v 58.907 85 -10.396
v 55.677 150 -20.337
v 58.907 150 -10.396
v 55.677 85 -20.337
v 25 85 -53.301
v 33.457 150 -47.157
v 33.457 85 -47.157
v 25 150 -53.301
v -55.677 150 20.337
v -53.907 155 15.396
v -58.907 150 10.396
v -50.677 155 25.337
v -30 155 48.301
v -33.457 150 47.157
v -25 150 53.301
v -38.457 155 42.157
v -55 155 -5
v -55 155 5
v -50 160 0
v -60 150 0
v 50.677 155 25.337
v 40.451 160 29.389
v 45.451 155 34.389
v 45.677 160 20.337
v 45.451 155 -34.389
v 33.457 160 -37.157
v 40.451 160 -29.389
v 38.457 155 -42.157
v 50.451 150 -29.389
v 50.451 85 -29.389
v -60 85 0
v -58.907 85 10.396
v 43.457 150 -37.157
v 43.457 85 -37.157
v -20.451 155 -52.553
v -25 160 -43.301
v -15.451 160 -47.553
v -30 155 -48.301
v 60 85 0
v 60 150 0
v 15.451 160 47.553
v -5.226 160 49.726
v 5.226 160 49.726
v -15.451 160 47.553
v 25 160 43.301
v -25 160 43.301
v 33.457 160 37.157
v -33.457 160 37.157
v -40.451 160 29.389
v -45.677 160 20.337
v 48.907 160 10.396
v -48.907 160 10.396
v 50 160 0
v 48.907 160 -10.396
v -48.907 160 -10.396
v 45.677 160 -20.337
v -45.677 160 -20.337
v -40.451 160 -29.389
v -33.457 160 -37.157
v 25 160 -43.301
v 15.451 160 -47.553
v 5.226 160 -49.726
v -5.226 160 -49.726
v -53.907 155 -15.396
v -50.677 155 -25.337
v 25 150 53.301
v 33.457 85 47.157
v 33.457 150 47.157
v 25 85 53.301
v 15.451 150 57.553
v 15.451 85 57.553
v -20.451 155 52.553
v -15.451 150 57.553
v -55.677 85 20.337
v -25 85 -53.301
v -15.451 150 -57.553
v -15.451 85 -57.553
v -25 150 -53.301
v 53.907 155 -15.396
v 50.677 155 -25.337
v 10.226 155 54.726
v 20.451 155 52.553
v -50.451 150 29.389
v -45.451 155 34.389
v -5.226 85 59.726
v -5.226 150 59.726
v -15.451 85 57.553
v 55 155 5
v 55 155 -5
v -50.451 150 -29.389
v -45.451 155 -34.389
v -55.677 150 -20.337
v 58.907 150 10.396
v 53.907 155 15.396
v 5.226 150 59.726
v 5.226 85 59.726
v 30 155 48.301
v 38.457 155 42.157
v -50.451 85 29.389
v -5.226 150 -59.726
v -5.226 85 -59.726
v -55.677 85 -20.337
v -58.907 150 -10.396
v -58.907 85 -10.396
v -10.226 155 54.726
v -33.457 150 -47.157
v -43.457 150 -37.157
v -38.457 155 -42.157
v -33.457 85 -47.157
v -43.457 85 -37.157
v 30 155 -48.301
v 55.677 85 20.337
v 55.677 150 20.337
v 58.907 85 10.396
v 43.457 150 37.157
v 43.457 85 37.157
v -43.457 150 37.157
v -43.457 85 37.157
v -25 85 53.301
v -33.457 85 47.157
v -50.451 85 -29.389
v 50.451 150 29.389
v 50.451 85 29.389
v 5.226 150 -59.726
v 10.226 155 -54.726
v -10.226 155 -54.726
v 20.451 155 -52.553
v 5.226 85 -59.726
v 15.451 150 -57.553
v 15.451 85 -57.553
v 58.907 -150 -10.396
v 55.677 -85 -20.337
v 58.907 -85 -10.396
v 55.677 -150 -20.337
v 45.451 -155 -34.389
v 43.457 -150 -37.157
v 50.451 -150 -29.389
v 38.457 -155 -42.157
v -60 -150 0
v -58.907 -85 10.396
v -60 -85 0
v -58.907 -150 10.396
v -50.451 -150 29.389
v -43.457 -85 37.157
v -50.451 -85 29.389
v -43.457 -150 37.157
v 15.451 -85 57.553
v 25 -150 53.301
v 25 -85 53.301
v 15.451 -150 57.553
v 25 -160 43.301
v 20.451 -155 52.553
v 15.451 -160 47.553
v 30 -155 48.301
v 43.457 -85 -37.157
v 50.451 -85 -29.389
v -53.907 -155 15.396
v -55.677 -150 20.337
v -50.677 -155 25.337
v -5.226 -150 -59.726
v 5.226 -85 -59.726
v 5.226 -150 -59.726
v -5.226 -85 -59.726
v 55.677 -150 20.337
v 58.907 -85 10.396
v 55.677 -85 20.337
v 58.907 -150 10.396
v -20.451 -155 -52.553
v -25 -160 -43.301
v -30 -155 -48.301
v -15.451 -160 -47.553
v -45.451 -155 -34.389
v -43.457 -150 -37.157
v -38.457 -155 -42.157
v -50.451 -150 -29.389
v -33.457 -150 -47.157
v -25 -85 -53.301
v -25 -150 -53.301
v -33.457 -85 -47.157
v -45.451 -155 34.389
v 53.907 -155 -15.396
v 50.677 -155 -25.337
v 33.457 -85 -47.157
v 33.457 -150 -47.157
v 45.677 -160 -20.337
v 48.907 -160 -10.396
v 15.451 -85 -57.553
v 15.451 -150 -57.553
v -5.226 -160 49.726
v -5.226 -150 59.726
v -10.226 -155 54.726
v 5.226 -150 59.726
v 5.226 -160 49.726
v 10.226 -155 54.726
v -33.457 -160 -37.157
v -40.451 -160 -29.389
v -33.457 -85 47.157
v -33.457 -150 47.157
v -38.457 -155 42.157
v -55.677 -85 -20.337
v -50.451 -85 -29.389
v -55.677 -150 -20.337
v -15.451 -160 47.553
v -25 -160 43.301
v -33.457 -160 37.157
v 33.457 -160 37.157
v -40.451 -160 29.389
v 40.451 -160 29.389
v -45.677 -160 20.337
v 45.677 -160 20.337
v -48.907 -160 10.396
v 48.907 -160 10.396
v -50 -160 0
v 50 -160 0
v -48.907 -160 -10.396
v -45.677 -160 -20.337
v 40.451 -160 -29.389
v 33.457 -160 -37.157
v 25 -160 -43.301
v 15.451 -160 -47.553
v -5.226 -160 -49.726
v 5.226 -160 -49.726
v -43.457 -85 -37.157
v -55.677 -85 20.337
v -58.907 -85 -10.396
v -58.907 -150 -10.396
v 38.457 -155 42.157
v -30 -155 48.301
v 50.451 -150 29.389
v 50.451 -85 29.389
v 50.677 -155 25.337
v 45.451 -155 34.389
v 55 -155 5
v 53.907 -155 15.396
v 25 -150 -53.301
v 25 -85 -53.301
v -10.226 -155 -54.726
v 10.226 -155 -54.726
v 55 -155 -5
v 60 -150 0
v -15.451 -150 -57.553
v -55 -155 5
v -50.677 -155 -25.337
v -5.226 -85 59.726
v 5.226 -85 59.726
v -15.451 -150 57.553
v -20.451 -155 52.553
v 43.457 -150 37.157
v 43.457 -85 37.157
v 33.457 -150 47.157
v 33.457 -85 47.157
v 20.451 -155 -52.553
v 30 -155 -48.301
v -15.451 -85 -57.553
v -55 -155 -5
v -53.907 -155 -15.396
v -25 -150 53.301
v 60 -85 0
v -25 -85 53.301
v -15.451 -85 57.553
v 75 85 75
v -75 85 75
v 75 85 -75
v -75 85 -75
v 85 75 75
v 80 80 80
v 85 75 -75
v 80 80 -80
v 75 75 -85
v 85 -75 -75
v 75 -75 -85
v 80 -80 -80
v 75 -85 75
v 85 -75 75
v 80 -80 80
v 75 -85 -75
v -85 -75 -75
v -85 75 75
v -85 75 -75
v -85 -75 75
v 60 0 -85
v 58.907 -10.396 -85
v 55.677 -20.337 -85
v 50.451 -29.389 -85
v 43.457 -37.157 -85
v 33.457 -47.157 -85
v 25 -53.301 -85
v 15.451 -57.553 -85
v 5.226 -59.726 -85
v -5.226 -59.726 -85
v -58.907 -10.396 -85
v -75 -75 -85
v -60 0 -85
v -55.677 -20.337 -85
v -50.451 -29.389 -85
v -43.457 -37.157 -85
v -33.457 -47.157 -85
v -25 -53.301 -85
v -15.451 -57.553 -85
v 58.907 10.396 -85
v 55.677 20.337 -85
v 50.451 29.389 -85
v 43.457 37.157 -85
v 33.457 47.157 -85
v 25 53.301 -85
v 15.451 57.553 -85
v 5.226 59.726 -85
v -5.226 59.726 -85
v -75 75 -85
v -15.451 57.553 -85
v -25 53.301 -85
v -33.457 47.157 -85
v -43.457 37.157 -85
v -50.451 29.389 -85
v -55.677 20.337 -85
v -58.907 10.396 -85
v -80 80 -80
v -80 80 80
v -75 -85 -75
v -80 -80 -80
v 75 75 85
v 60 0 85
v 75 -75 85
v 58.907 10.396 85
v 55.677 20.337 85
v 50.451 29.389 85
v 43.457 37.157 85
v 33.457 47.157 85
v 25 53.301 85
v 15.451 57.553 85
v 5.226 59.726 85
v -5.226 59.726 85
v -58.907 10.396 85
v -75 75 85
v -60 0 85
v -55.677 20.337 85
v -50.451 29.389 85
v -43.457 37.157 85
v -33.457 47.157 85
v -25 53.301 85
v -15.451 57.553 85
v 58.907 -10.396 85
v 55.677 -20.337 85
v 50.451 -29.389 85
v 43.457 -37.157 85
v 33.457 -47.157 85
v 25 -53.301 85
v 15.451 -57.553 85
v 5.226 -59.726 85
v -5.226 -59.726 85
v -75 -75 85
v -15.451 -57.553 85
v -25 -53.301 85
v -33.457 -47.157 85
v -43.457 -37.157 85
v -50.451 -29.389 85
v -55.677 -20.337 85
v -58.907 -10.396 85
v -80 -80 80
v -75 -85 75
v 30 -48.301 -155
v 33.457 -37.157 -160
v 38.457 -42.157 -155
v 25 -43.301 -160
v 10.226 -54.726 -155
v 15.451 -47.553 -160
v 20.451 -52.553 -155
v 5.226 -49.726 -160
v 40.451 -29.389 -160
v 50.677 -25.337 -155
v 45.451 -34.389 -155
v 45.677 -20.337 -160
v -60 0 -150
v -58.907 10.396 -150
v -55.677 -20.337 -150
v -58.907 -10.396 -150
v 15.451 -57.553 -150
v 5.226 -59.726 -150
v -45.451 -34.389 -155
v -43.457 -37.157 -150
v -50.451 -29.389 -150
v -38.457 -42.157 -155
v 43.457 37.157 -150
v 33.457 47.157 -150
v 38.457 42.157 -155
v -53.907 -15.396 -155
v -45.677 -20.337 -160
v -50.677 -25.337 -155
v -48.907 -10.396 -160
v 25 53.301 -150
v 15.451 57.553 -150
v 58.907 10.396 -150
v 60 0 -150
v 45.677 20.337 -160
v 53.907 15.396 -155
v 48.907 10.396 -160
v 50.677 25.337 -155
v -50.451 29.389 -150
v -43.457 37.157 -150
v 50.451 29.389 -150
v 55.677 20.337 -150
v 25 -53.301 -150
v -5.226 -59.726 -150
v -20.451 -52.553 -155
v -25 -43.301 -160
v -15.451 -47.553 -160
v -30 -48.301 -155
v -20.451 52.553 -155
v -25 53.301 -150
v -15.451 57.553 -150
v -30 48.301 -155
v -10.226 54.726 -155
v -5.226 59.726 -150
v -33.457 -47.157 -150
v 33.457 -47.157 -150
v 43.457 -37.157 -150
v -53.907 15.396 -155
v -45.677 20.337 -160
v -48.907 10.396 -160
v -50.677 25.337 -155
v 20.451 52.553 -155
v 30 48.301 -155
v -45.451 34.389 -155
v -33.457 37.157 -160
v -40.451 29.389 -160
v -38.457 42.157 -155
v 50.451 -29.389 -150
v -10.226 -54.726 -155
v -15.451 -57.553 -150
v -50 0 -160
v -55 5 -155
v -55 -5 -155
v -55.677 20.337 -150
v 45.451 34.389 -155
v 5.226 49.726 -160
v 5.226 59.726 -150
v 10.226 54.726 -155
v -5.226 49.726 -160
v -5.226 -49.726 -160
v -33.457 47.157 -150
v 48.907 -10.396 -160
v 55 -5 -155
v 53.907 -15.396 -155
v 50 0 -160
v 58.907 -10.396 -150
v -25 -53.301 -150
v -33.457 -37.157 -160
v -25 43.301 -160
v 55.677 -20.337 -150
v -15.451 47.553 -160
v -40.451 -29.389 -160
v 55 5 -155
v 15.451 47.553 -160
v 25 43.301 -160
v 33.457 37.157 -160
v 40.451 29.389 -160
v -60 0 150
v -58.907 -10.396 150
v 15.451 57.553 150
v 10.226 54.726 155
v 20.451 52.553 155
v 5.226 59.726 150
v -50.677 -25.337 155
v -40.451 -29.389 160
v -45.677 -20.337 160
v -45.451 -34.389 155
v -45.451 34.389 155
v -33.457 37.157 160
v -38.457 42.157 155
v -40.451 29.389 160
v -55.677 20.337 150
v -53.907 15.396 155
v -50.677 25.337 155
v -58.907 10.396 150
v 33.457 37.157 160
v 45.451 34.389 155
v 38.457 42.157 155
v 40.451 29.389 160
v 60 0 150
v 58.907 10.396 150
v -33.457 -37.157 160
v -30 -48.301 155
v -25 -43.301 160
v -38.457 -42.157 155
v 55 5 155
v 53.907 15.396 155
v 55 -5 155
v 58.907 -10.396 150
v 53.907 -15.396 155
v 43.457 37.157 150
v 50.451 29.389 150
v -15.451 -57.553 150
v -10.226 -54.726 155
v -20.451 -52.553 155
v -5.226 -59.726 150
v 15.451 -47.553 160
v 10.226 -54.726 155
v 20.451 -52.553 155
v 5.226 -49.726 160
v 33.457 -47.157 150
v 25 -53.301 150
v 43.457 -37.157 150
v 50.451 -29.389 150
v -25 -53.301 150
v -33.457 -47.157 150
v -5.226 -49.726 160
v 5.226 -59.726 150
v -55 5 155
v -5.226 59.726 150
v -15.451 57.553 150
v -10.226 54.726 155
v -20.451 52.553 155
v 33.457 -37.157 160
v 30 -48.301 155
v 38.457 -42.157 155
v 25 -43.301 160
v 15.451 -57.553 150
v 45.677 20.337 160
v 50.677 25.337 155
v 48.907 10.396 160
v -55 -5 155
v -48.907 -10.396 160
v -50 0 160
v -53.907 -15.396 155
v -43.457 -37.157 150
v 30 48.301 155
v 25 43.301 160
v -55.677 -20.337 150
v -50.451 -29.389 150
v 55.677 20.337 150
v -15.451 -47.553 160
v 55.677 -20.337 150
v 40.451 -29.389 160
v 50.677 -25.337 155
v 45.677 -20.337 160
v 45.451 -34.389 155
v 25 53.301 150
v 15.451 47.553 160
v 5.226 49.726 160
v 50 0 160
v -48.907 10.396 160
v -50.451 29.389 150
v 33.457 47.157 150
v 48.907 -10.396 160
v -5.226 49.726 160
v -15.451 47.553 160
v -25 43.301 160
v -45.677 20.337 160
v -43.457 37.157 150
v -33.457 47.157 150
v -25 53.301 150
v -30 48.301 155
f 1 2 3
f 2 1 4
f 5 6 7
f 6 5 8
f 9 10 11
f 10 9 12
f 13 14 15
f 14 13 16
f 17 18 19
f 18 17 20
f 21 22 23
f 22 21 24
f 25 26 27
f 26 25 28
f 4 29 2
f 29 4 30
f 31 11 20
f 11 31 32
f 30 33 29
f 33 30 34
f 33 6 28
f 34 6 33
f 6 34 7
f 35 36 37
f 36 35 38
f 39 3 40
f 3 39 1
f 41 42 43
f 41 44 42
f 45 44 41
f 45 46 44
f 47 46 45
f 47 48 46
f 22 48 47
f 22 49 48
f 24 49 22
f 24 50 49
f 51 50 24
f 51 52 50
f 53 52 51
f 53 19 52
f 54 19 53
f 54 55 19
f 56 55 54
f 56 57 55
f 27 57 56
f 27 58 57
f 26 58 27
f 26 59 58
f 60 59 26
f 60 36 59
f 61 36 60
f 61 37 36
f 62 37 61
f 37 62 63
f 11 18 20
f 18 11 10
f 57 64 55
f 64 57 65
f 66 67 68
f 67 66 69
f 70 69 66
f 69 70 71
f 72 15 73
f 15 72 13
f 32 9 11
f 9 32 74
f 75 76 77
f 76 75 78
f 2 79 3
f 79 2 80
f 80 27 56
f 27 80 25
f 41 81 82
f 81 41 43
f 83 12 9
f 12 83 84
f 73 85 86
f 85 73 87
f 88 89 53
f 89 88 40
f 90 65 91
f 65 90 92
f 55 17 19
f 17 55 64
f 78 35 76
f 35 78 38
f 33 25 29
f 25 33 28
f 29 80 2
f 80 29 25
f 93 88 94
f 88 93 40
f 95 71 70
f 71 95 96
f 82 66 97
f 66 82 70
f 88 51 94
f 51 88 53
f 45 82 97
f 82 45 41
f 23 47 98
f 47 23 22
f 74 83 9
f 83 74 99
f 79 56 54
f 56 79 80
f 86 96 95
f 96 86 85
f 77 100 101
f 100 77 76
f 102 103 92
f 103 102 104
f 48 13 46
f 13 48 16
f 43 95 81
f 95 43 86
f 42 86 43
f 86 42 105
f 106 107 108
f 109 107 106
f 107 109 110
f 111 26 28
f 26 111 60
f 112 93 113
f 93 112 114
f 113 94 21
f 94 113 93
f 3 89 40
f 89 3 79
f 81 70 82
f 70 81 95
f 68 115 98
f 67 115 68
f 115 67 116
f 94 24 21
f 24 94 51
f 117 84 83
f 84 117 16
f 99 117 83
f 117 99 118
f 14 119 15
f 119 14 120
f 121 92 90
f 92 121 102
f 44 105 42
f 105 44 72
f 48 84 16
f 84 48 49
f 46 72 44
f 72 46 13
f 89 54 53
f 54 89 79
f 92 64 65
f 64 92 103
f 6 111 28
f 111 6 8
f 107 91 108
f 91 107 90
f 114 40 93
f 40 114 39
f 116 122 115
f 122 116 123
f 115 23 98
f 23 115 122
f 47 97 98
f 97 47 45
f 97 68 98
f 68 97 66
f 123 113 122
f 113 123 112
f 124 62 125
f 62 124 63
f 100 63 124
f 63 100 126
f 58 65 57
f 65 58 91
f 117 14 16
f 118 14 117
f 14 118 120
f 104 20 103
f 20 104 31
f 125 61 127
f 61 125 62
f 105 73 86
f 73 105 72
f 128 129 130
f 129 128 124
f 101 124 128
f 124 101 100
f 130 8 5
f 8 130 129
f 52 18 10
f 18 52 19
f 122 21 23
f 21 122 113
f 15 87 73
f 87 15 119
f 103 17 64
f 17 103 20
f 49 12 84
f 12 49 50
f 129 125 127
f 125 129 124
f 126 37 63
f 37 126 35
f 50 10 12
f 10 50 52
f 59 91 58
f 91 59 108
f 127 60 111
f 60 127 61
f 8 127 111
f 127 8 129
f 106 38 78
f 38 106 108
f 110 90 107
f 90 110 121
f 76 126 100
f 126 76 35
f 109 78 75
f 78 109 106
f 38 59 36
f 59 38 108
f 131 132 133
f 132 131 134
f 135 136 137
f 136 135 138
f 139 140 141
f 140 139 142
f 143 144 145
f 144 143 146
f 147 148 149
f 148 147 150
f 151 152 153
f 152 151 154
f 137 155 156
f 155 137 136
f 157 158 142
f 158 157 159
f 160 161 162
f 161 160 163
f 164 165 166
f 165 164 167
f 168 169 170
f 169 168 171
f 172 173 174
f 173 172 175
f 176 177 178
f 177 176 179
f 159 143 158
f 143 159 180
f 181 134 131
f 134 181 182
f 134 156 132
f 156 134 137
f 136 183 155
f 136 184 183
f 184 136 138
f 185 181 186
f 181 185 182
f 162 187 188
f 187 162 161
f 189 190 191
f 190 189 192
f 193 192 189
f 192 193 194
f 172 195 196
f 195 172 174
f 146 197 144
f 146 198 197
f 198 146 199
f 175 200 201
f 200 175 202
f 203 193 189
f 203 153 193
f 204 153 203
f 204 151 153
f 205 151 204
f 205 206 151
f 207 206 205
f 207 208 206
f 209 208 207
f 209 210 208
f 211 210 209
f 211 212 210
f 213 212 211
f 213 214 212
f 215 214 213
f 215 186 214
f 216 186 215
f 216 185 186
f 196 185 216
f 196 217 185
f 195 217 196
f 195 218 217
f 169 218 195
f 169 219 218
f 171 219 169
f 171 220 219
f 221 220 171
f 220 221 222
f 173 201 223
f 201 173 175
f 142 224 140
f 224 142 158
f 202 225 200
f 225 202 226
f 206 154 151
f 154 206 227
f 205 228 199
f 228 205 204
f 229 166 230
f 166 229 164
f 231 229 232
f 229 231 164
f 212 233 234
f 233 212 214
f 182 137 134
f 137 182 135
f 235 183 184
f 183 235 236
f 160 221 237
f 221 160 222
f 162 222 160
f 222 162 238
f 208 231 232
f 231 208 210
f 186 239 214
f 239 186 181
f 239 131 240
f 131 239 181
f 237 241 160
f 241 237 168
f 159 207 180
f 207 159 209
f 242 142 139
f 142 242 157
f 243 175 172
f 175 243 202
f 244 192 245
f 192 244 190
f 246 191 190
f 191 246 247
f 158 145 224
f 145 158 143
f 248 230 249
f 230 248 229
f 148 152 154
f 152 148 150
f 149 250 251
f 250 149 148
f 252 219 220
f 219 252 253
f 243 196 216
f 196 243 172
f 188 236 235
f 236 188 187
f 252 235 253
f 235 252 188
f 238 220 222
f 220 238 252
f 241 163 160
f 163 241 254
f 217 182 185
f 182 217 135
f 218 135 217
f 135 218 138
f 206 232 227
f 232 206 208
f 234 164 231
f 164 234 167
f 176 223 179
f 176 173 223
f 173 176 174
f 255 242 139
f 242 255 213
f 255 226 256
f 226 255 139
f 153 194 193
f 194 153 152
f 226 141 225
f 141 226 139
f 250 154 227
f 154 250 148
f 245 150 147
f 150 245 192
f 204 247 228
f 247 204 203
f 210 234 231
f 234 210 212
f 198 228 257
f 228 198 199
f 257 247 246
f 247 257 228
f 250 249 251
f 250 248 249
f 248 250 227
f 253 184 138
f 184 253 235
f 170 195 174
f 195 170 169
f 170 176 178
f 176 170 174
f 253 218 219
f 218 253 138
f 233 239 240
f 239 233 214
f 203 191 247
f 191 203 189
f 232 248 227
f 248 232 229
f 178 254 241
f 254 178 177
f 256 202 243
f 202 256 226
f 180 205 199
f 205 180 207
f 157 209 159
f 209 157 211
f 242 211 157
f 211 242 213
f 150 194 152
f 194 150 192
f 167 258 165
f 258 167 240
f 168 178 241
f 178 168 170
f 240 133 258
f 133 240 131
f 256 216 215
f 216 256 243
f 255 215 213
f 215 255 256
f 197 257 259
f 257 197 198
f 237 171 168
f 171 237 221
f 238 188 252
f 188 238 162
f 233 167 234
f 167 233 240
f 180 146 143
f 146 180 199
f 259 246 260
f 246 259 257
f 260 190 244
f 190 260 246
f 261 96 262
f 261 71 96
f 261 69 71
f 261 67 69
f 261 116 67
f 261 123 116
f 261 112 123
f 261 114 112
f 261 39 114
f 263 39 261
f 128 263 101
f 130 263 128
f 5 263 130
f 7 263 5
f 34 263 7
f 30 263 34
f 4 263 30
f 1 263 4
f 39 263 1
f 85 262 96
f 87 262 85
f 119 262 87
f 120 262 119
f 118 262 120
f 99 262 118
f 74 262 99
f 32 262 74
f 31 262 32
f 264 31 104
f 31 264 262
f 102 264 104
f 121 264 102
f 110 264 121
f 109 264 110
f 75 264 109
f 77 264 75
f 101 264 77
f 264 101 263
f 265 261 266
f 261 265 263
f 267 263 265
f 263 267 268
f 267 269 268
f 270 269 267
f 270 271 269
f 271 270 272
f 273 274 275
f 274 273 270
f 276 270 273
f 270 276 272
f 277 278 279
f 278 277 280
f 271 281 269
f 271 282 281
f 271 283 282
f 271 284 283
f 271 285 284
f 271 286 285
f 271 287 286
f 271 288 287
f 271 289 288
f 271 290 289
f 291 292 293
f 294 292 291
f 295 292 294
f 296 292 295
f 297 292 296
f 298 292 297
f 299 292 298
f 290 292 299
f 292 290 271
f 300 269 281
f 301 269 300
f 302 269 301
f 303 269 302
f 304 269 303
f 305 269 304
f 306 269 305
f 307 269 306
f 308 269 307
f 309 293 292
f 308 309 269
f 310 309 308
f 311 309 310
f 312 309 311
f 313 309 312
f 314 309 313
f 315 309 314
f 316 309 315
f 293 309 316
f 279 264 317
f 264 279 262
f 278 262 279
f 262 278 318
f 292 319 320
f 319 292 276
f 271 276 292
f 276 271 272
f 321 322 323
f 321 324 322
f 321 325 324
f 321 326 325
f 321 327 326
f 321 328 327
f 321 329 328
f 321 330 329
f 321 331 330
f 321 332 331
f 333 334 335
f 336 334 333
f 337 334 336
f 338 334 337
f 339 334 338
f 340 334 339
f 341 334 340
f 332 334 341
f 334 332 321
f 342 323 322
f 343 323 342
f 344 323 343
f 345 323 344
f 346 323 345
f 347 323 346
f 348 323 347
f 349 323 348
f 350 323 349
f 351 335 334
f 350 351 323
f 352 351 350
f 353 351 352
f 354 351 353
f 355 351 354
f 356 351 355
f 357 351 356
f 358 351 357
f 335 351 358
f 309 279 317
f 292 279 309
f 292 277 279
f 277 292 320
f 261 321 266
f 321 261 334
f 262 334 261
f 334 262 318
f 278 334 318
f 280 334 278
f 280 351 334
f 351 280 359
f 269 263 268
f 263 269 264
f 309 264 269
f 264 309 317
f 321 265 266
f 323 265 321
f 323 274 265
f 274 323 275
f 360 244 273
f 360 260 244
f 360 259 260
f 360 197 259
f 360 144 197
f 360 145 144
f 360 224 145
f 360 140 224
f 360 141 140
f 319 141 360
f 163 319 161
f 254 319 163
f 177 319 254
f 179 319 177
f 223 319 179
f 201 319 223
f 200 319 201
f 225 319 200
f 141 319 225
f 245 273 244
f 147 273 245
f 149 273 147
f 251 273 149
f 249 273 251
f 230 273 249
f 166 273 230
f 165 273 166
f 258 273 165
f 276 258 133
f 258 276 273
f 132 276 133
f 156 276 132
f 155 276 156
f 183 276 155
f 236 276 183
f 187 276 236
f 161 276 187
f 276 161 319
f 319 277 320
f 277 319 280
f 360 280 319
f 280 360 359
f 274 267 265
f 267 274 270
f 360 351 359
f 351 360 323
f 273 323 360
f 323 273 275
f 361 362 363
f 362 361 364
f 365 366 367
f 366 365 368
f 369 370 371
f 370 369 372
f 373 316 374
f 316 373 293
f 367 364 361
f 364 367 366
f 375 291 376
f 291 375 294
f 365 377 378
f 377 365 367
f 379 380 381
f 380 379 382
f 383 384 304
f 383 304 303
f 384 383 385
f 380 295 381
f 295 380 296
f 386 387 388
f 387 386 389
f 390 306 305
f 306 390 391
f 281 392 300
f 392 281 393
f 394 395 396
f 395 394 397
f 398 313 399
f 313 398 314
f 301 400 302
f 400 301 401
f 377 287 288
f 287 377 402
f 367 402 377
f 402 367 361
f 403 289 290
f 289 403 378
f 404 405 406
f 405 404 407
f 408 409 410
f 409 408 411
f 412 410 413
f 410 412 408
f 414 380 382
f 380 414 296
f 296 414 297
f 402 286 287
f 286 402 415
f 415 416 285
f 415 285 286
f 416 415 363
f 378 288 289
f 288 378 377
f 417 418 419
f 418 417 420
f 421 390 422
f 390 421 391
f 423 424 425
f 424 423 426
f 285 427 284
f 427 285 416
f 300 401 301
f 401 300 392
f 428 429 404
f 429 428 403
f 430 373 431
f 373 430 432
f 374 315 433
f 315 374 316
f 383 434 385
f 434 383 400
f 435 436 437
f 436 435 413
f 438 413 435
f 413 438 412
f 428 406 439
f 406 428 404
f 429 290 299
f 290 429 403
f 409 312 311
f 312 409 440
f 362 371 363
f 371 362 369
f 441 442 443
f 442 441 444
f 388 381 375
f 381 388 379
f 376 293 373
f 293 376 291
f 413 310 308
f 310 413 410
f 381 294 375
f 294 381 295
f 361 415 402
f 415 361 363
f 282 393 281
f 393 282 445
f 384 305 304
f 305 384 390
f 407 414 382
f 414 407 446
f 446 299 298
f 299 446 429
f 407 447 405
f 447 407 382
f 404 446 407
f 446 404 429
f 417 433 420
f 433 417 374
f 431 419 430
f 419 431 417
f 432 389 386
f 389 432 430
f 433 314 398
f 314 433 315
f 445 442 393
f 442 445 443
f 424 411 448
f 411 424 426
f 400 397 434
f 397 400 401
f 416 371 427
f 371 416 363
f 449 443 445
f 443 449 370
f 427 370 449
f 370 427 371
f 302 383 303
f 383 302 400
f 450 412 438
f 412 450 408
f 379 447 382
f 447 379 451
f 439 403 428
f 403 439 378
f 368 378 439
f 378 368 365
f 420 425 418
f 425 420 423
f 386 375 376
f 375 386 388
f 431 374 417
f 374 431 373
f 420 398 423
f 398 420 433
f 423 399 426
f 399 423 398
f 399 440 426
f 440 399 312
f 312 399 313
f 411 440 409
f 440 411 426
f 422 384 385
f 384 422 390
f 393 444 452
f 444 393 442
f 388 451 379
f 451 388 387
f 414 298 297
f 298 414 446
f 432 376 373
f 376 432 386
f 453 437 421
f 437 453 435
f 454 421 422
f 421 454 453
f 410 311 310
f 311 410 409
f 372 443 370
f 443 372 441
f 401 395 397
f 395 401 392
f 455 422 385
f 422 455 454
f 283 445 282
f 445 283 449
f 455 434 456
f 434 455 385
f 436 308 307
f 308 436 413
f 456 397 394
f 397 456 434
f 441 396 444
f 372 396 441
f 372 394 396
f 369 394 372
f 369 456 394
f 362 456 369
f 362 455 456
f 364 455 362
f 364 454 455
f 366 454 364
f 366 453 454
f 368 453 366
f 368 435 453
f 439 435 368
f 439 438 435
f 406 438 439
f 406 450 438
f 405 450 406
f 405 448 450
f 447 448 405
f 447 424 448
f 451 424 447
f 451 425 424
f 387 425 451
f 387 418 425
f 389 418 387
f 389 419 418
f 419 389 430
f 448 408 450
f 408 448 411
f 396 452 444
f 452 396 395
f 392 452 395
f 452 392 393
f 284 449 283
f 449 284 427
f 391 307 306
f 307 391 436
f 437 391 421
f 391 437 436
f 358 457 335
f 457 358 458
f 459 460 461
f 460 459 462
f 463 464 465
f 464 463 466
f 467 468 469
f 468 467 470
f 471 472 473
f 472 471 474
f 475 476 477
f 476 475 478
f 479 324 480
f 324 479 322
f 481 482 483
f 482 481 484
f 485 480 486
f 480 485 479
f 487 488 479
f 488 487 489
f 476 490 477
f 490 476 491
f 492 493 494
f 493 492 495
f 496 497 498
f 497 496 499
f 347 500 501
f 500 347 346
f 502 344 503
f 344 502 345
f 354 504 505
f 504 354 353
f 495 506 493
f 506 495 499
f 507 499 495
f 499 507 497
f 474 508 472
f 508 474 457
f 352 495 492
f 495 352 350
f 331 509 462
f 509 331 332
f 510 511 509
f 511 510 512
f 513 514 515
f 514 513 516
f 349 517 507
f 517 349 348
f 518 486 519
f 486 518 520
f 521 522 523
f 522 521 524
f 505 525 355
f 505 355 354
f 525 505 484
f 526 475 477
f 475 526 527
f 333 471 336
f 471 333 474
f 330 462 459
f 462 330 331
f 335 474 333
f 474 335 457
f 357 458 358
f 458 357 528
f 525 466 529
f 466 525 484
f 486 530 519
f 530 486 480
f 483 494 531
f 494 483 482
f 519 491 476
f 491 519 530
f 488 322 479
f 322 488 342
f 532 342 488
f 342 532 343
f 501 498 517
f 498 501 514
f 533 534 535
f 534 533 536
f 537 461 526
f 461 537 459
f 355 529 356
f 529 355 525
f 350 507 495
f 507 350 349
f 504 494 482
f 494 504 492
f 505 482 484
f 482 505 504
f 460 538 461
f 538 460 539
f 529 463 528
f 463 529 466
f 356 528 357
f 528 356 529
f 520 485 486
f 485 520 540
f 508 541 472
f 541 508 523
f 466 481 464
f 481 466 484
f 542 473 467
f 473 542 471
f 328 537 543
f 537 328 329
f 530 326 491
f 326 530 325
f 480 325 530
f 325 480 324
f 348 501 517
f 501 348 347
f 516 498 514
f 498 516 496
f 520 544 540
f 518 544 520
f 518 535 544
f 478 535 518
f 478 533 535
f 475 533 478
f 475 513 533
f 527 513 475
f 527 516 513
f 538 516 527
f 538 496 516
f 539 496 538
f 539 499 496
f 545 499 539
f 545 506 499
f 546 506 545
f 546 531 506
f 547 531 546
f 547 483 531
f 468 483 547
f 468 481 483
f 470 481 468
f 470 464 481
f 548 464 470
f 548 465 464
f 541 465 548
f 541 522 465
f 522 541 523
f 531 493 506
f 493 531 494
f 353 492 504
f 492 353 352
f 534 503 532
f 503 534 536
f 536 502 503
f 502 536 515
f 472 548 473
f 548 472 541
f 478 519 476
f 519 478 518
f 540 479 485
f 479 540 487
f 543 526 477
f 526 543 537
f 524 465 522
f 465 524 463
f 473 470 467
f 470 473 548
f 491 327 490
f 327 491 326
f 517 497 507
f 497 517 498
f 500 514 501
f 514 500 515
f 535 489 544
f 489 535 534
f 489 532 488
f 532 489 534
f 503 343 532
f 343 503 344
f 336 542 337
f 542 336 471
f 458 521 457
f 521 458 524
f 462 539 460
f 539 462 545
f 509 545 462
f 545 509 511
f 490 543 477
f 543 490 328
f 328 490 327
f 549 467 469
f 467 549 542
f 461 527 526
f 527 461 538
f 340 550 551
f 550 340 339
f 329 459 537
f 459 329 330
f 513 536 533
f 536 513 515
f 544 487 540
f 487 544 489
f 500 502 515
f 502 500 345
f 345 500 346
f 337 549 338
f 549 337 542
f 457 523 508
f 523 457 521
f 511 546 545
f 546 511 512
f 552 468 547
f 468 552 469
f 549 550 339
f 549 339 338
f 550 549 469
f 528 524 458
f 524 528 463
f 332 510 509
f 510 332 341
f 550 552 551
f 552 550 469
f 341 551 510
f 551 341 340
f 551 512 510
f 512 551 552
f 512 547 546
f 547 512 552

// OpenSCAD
// quick preview might not display properly.
// slow rendering works fine. 
module offset_outwards() {
    render() { 
        minkowski() {
            children(0);
            children(1);
        }
    }
}

module offset_inwards(bbox = [500, 500, 500])
{
    invert_volume(0.9 * bbox)
    offset_outwards() {
        invert_volume(bbox) 
            children(1);  // the object 
        children(0);      // the tool
    }
}

// function below is identity
module invert_volume_twice(bbox = [500, 500, 500]) {
    invert_volume(0.9 * bbox)
    invert_volume(bbox)
    children(0);
}

module invert_volume(bbox) {
    difference() {
        cube(bbox, center=true);
        children();
    }        
}



module use_fillets(size=1, horizontal_edges=true, vertical_edges=true)
{
    epsilon = 2*size;

    if (vertical_edges && horizontal_edges)
    {
        sphere(r = size);
    }
    else if (vertical_edges)
    {
        cylinder(r = size, h=epsilon, center=true);
    }
    else if (horizontal_edges)
    {
        intersection () {
            rotate([ 90, 0, 0 ]) cylinder(r = size, h=2*size, center=true);
            rotate([ 0, 90, 0 ]) cylinder(r = size, h=2*size, center=true);
        }
    }
    else
    {
        assert(false, "must fillet either horizontal, vertical, or both edges.");
    }
}

module use_chamfer(size=1, horizontal_edges=true, vertical_edges=true)
{
    c = size * 2 / sqrt(2);

    if (vertical_edges && horizontal_edges)
    {
        intersection ()
        {
            rotate([ 45, 0, 0 ])
            cube([ 2*c, c, c ], center=true);

            rotate([ 0, 45, 0 ])
            cube([ c, 2*c, c ], center=true);

            rotate([ 0, 0, 45 ])
            cube([ c, c, 2*c ], center=true);
        }
    }
    else if (vertical_edges)
    {    
            rotate([ 0, 0, 45 ])
            cube([ c, c, 2*c ], center=true);
    }
    else if (horizontal_edges)
    {
        intersection ()
        {
            rotate([ 45, 0, 0 ])
            cube([ 2*c, c, c ], center=true);

            rotate([ 0, 45, 0 ])
            cube([ c, 2*c, c ], center=true);
        }
    }
    else
    {
        assert(false, "must fillet either horizontal, vertical, or both edges.");
    }
}

module test_shape(size=150)
{
    cube([ size, size, size ], center=true);
    cylinder(r=size/3, h=2*size, center=true);
    rotate([ 90, 0, 0]) cylinder(r=size/3, h=2*size, center=true);
}

module test(size=10, horizontal_edges=true, vertical_edges=true, 
    with_chamfer=true, outwards=true)
{
    if (with_chamfer)
    {
        if (outwards)
            offset_outwards()
            {
                use_chamfer(size, horizontal_edges, vertical_edges);
                test_shape();
            }
        else
            offset_inwards()
            {
                use_chamfer(size, horizontal_edges, vertical_edges);
                test_shape();
            }            
    } else { 
        if (outwards)
            offset_outwards()
            {
                use_fillets(size, horizontal_edges, vertical_edges);
                test_shape();
            }
        else
            offset_inwards()
            {
                use_fillets(size, horizontal_edges, vertical_edges);
                test_shape();
            }
    }
}

test();
